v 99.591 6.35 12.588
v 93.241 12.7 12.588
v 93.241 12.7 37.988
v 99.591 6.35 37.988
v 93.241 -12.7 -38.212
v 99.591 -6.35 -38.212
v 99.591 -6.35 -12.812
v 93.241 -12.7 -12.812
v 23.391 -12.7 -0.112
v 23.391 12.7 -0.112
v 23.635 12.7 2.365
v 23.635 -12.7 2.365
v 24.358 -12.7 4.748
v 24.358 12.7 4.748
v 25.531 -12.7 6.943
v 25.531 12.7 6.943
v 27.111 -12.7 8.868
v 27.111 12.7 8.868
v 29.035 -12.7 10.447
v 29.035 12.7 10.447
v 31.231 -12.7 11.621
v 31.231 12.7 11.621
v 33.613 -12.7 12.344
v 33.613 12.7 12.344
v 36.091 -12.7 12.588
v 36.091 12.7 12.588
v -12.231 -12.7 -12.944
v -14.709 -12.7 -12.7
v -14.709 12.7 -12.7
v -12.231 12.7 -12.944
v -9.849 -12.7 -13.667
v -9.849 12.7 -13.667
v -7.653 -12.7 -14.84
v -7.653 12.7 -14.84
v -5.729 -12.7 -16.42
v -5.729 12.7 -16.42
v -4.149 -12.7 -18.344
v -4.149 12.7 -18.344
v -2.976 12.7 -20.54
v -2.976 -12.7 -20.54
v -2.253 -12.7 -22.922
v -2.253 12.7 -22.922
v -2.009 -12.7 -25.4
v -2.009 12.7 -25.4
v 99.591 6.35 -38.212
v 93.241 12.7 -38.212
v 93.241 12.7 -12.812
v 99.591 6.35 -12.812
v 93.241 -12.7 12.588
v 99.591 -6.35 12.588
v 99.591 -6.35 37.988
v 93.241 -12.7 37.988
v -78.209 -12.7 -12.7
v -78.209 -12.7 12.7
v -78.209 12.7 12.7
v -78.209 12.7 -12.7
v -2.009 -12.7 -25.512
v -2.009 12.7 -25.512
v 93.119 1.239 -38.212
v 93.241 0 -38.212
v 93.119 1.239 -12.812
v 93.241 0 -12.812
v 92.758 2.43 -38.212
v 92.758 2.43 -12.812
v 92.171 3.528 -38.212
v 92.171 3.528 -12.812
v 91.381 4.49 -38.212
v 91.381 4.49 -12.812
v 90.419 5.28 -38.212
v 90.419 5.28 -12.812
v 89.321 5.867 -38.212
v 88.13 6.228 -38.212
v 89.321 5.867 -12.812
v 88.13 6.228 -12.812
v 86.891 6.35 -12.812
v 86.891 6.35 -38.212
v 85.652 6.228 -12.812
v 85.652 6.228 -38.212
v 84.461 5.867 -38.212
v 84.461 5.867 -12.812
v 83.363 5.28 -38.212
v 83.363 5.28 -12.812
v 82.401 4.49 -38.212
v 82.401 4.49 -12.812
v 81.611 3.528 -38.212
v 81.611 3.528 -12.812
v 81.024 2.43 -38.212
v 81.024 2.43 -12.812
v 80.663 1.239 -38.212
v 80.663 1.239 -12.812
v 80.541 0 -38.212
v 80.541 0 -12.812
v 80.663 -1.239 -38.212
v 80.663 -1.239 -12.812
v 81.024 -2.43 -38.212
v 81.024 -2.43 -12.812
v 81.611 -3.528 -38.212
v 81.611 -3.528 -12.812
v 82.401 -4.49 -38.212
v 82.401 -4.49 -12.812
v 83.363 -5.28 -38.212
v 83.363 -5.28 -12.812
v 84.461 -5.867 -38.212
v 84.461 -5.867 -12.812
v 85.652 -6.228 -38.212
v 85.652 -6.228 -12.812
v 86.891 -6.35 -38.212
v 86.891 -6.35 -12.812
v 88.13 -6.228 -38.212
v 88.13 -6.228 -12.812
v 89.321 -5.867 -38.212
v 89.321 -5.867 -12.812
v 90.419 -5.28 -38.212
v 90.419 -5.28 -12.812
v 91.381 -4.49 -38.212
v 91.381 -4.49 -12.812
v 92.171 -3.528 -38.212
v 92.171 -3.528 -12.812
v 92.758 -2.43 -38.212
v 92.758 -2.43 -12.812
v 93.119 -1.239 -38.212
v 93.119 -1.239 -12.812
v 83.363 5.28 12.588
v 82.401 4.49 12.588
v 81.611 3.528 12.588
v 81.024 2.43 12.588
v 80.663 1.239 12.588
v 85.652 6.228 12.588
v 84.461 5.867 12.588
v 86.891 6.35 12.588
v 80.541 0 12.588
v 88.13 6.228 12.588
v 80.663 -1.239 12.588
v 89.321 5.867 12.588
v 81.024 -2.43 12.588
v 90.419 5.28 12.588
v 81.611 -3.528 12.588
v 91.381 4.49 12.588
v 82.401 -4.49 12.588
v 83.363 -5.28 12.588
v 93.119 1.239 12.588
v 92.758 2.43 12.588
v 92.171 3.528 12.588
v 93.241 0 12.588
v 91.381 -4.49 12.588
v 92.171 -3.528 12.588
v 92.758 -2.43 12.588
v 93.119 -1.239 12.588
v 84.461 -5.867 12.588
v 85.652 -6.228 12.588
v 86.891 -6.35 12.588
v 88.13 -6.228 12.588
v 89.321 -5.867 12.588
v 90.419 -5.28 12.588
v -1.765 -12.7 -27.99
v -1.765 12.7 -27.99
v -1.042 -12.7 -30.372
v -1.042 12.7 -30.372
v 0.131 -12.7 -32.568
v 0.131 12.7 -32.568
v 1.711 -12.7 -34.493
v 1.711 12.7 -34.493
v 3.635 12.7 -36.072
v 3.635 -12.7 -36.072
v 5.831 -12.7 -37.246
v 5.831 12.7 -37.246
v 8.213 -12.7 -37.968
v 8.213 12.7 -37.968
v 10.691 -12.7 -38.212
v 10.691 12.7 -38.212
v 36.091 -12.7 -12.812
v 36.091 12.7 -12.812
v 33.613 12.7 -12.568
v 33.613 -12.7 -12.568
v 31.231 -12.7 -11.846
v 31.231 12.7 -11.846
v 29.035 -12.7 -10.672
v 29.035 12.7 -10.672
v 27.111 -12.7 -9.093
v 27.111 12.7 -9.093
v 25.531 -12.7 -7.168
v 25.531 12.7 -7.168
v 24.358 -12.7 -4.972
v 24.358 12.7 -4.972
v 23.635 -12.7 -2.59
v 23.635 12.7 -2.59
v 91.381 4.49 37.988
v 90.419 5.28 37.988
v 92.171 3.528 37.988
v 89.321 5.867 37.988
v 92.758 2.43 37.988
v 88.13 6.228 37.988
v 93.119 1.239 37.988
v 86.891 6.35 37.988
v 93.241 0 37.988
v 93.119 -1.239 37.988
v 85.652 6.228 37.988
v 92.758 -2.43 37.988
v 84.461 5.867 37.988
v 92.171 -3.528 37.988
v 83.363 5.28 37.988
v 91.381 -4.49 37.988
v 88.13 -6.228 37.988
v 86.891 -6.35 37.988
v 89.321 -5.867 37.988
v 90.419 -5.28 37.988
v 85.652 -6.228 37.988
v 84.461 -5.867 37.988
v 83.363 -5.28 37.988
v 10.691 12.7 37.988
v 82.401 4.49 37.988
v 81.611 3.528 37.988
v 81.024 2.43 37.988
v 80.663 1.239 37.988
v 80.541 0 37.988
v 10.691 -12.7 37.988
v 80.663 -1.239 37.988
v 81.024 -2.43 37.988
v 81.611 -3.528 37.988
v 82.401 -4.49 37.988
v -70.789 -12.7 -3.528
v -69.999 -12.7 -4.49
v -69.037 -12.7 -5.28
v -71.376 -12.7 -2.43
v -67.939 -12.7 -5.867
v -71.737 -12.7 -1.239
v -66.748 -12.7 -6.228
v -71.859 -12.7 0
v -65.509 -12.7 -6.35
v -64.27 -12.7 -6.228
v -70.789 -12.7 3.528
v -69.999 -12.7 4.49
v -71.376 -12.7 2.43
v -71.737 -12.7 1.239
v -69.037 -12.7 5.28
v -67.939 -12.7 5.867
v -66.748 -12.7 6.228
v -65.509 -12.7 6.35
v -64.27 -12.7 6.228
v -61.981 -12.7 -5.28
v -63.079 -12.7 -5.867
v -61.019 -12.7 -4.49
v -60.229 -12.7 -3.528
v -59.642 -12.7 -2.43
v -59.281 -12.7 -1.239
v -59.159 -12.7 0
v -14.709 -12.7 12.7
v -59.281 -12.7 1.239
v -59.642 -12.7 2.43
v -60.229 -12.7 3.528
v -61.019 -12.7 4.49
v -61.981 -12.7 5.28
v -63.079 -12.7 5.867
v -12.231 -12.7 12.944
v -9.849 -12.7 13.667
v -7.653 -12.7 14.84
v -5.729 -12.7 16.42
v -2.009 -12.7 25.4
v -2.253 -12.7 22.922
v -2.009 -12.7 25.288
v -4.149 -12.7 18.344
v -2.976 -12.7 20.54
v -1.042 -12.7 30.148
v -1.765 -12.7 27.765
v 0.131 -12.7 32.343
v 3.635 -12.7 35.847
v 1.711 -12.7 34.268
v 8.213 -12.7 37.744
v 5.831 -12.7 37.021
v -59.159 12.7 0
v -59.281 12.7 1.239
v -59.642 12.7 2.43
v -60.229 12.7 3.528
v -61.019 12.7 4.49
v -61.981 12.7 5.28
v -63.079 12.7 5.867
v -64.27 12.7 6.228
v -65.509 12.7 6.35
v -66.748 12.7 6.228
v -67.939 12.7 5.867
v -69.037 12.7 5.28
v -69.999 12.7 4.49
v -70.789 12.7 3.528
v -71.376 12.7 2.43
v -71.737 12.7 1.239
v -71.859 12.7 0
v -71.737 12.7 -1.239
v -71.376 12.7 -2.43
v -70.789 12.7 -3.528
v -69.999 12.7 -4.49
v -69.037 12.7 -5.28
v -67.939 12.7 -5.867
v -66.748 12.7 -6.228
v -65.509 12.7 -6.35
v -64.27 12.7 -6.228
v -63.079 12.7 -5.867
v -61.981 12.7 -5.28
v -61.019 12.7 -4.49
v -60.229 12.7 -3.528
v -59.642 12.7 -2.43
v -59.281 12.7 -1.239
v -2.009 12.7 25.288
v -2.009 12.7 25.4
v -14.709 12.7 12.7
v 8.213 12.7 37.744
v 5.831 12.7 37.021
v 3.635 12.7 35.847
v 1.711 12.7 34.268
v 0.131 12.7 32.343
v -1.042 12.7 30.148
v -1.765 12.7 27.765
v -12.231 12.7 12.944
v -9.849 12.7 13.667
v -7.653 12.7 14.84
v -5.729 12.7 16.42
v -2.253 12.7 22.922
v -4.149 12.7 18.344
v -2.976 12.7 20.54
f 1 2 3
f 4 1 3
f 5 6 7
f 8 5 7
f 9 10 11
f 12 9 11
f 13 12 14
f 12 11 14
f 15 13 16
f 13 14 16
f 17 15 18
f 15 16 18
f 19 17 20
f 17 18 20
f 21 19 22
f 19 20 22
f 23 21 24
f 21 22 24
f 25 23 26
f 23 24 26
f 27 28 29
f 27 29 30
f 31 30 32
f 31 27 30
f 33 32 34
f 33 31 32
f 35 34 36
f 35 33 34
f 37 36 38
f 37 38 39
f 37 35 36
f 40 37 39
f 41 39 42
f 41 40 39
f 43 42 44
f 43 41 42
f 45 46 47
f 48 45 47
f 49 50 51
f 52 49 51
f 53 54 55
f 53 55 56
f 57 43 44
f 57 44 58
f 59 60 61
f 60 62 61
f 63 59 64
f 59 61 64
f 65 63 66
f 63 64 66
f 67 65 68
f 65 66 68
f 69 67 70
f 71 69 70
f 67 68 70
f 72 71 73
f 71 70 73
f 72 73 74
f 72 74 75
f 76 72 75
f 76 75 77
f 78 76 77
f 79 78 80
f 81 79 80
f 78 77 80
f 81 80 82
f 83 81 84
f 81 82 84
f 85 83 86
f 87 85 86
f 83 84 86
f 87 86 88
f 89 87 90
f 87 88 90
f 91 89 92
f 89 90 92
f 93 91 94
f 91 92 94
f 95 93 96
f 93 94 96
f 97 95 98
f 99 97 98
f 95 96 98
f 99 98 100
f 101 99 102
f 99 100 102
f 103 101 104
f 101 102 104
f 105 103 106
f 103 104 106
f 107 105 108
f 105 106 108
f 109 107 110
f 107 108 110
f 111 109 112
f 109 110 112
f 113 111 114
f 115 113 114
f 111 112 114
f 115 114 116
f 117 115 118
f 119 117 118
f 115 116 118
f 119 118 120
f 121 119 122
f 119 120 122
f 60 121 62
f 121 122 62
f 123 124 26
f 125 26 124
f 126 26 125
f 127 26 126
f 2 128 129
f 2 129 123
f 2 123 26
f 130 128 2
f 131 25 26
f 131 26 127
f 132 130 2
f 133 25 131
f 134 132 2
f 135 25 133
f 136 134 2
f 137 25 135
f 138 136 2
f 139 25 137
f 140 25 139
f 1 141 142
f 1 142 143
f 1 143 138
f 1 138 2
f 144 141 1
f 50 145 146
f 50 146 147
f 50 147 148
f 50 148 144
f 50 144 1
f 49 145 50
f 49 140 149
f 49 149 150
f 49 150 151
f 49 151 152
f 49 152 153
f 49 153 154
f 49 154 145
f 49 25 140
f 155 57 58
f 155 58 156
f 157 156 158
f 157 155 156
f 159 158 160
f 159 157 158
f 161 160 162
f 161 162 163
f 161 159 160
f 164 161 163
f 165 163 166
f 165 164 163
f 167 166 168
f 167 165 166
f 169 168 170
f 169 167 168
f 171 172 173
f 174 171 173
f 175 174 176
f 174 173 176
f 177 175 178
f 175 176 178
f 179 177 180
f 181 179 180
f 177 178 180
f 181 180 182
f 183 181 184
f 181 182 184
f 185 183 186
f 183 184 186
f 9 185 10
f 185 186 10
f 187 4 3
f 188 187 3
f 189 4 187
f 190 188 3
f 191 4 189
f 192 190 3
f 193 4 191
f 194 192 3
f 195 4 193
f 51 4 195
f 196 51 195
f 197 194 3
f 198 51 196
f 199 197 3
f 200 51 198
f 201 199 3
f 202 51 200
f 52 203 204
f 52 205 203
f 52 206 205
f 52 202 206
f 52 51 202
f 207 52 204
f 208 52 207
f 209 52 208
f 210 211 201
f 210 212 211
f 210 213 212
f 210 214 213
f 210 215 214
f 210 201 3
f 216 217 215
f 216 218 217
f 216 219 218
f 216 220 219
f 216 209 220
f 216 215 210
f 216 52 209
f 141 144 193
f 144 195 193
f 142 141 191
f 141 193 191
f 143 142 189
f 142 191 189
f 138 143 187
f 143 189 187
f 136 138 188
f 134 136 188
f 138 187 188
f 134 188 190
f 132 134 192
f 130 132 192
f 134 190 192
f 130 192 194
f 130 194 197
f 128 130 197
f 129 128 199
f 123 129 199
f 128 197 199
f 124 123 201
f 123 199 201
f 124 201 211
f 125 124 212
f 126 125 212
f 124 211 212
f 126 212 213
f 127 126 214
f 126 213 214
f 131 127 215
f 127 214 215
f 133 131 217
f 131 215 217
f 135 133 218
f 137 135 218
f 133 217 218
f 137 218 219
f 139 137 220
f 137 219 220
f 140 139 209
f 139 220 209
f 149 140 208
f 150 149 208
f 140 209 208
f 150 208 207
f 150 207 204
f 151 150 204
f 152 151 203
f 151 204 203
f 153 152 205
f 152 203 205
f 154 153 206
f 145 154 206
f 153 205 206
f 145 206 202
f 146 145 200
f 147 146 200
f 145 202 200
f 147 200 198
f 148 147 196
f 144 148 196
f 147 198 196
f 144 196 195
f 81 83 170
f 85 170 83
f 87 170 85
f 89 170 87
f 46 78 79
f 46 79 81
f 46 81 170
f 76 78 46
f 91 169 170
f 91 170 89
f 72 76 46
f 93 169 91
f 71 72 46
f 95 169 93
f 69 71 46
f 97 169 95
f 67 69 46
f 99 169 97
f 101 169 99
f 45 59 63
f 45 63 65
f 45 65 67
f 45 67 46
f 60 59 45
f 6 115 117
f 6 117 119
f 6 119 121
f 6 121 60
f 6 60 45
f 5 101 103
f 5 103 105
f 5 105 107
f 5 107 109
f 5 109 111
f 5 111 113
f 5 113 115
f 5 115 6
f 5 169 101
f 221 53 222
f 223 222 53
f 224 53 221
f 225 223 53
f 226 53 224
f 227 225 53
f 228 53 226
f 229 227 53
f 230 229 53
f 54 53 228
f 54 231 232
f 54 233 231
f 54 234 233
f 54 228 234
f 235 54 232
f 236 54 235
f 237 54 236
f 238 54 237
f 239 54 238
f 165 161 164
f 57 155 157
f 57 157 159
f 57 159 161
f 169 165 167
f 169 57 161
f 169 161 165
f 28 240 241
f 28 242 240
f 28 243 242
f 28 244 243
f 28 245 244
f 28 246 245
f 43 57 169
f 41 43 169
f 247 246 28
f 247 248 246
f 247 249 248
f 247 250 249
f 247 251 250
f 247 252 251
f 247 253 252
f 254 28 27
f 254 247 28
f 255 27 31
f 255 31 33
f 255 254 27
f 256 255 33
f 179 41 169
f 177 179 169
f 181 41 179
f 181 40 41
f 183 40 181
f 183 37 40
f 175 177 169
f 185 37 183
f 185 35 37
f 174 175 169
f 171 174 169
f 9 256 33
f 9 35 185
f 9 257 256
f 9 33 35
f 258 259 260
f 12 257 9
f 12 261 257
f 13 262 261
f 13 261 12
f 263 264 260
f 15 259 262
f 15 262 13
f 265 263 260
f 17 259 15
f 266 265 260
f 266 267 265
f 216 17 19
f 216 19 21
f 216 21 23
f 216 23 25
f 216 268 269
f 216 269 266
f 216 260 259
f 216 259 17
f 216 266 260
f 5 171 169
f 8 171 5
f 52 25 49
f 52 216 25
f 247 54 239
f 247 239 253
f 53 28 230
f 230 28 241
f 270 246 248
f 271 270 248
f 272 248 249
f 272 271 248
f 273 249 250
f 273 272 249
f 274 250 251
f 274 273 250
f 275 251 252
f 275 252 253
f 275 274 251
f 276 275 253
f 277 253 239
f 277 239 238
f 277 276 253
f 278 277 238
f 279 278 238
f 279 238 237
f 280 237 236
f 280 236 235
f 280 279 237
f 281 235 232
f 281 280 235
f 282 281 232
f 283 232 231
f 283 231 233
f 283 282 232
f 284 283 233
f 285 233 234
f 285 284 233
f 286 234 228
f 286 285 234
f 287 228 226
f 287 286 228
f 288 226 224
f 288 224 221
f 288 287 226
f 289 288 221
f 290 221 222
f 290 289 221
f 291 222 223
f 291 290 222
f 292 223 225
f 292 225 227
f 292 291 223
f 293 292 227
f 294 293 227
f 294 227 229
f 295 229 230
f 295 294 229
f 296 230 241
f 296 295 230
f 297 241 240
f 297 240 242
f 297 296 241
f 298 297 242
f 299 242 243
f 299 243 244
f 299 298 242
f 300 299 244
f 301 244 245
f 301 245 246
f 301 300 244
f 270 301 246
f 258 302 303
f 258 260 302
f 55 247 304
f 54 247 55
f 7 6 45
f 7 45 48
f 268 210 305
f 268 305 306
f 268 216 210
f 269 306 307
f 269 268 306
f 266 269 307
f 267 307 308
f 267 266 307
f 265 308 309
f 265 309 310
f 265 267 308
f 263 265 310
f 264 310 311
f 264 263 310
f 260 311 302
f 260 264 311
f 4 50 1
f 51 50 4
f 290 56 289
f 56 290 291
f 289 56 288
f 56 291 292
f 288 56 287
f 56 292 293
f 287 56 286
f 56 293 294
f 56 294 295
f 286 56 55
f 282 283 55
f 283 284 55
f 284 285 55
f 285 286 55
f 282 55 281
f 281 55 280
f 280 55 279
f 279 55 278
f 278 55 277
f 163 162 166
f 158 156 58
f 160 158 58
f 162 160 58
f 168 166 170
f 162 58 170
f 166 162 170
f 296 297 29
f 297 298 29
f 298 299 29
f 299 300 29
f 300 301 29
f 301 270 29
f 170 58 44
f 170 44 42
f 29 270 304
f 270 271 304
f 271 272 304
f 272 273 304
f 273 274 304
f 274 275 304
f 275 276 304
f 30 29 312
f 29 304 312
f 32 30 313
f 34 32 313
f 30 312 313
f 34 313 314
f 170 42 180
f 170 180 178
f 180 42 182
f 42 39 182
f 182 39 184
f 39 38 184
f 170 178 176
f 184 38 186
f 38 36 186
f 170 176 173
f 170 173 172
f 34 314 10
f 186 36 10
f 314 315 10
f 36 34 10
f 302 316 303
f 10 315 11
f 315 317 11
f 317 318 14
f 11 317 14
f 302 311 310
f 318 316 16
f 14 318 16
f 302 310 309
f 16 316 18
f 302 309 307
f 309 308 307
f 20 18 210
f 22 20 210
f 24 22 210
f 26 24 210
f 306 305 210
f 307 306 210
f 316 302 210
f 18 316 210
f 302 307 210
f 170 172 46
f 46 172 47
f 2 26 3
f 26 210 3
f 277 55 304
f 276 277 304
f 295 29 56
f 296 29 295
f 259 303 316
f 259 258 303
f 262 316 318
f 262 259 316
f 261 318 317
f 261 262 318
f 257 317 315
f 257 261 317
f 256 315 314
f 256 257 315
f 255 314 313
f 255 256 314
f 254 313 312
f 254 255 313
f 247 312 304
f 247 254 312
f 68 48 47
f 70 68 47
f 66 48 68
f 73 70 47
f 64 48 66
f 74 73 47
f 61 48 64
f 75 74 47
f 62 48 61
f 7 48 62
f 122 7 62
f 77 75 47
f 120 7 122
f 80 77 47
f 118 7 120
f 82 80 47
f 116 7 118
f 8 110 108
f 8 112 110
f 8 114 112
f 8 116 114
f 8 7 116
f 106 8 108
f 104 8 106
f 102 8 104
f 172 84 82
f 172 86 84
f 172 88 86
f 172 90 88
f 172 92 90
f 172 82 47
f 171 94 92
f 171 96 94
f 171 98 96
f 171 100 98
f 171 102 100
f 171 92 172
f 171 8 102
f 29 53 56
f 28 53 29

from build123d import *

# Parameters (mm, degrees)
F0_R     = 6.35
F1_DEPTH = 12.7
F2_R     = 6.35
F3_DEPTH = 44.45
F4_SIZE  = 6.35
F5_SIZE  = 6.35
F6_SIZE  = 6.35
F7_SIZE  = 6.35


# Not quite as in the source:
# - a feature names something its author has since deleted; it is built from what else it names


with BuildPart() as f1:
    # F0 (on Front) → F1 (new body, symmetric)
    with BuildSketch(Plane.XZ):
        with BuildLine():
            Line((-14.7091181397, 12.7), (-78.2091181397, 12.7))
            Line((-78.2091181397, 12.7), (-78.2091181397, -12.7))
            Line((-78.2091181397, -12.7), (-14.7091181397, -12.7))
            ThreePointArc((-14.7091181397, -12.7), (-5.7288620187, -16.4197438789), (-2.0091181397, -25.4))
            Line((-2.0091181397, -25.4), (-2.0091181397, -25.5123577416))
            ThreePointArc((-2.0091181397, -25.5123577416), (1.7106257392, -34.4926138626), (10.6908818603, -38.2123577416))
            Line((10.6908818603, -38.2123577416), (99.5908818603, -38.2123577416))
            Line((99.5908818603, -38.2123577416), (99.5908818603, -12.8123577416))
            Line((99.5908818603, -12.8123577416), (36.0908818603, -12.8123577416))
            ThreePointArc((36.0908818603, -12.8123577416), (27.1106257392, -9.0926138626), (23.3908818603, -0.1123577416))
            ThreePointArc((23.3908818603, -0.1123577416), (27.1106257392, 8.8678983795), (36.0908818603, 12.5876422584))
            Line((36.0908818603, 12.5876422584), (99.5908818603, 12.5876422584))
            Line((99.5908818603, 12.5876422584), (99.5908818603, 37.9876422584))
            Line((99.5908818603, 37.9876422584), (10.6908818603, 37.9876422584))
            ThreePointArc((10.6908818603, 37.9876422584), (1.7106257392, 34.2678983795), (-2.0091181397, 25.2876422584))
            Line((-2.0091181397, 25.2876422584), (-2.0091181397, 25.4))
            ThreePointArc((-2.0091181397, 25.4), (-5.7288620187, 16.4197438789), (-14.7091181397, 12.7))
        make_face()
        with Locations((-65.5091181397, 0)):
            Circle(F0_R, mode=Mode.SUBTRACT)
    extrude(amount=F1_DEPTH, both=True)

    # F2 (on Top) → F3 (cut, symmetric)
    with BuildSketch(Plane.XY):
        with Locations((86.8908818603, 0)):
            Circle(F2_R)
    extrude(amount=F3_DEPTH, both=True, mode=Mode.SUBTRACT)

    # F4
    f4_edges = [f1.edges().sort_by_distance(p)[0] for p in [
        (99.590882, -12.7, 25.287642),
    ]]
    chamfer(f4_edges, length=F4_SIZE)

    # F5
    f5_edges = [f1.edges().sort_by_distance(p)[0] for p in [
        (99.590882, 12.7, 25.287642),
    ]]
    chamfer(f5_edges, length=F5_SIZE)

    # F6
    f6_edges = [f1.edges().sort_by_distance(p)[0] for p in [
        (99.590882, -12.7, -25.512358),
    ]]
    chamfer(f6_edges, length=F6_SIZE)

    # F7
    f7_edges = [f1.edges().sort_by_distance(p)[0] for p in [
        (99.590882, 12.7, -25.512358),
    ]]
    chamfer(f7_edges, length=F7_SIZE)


solid = f1.part
